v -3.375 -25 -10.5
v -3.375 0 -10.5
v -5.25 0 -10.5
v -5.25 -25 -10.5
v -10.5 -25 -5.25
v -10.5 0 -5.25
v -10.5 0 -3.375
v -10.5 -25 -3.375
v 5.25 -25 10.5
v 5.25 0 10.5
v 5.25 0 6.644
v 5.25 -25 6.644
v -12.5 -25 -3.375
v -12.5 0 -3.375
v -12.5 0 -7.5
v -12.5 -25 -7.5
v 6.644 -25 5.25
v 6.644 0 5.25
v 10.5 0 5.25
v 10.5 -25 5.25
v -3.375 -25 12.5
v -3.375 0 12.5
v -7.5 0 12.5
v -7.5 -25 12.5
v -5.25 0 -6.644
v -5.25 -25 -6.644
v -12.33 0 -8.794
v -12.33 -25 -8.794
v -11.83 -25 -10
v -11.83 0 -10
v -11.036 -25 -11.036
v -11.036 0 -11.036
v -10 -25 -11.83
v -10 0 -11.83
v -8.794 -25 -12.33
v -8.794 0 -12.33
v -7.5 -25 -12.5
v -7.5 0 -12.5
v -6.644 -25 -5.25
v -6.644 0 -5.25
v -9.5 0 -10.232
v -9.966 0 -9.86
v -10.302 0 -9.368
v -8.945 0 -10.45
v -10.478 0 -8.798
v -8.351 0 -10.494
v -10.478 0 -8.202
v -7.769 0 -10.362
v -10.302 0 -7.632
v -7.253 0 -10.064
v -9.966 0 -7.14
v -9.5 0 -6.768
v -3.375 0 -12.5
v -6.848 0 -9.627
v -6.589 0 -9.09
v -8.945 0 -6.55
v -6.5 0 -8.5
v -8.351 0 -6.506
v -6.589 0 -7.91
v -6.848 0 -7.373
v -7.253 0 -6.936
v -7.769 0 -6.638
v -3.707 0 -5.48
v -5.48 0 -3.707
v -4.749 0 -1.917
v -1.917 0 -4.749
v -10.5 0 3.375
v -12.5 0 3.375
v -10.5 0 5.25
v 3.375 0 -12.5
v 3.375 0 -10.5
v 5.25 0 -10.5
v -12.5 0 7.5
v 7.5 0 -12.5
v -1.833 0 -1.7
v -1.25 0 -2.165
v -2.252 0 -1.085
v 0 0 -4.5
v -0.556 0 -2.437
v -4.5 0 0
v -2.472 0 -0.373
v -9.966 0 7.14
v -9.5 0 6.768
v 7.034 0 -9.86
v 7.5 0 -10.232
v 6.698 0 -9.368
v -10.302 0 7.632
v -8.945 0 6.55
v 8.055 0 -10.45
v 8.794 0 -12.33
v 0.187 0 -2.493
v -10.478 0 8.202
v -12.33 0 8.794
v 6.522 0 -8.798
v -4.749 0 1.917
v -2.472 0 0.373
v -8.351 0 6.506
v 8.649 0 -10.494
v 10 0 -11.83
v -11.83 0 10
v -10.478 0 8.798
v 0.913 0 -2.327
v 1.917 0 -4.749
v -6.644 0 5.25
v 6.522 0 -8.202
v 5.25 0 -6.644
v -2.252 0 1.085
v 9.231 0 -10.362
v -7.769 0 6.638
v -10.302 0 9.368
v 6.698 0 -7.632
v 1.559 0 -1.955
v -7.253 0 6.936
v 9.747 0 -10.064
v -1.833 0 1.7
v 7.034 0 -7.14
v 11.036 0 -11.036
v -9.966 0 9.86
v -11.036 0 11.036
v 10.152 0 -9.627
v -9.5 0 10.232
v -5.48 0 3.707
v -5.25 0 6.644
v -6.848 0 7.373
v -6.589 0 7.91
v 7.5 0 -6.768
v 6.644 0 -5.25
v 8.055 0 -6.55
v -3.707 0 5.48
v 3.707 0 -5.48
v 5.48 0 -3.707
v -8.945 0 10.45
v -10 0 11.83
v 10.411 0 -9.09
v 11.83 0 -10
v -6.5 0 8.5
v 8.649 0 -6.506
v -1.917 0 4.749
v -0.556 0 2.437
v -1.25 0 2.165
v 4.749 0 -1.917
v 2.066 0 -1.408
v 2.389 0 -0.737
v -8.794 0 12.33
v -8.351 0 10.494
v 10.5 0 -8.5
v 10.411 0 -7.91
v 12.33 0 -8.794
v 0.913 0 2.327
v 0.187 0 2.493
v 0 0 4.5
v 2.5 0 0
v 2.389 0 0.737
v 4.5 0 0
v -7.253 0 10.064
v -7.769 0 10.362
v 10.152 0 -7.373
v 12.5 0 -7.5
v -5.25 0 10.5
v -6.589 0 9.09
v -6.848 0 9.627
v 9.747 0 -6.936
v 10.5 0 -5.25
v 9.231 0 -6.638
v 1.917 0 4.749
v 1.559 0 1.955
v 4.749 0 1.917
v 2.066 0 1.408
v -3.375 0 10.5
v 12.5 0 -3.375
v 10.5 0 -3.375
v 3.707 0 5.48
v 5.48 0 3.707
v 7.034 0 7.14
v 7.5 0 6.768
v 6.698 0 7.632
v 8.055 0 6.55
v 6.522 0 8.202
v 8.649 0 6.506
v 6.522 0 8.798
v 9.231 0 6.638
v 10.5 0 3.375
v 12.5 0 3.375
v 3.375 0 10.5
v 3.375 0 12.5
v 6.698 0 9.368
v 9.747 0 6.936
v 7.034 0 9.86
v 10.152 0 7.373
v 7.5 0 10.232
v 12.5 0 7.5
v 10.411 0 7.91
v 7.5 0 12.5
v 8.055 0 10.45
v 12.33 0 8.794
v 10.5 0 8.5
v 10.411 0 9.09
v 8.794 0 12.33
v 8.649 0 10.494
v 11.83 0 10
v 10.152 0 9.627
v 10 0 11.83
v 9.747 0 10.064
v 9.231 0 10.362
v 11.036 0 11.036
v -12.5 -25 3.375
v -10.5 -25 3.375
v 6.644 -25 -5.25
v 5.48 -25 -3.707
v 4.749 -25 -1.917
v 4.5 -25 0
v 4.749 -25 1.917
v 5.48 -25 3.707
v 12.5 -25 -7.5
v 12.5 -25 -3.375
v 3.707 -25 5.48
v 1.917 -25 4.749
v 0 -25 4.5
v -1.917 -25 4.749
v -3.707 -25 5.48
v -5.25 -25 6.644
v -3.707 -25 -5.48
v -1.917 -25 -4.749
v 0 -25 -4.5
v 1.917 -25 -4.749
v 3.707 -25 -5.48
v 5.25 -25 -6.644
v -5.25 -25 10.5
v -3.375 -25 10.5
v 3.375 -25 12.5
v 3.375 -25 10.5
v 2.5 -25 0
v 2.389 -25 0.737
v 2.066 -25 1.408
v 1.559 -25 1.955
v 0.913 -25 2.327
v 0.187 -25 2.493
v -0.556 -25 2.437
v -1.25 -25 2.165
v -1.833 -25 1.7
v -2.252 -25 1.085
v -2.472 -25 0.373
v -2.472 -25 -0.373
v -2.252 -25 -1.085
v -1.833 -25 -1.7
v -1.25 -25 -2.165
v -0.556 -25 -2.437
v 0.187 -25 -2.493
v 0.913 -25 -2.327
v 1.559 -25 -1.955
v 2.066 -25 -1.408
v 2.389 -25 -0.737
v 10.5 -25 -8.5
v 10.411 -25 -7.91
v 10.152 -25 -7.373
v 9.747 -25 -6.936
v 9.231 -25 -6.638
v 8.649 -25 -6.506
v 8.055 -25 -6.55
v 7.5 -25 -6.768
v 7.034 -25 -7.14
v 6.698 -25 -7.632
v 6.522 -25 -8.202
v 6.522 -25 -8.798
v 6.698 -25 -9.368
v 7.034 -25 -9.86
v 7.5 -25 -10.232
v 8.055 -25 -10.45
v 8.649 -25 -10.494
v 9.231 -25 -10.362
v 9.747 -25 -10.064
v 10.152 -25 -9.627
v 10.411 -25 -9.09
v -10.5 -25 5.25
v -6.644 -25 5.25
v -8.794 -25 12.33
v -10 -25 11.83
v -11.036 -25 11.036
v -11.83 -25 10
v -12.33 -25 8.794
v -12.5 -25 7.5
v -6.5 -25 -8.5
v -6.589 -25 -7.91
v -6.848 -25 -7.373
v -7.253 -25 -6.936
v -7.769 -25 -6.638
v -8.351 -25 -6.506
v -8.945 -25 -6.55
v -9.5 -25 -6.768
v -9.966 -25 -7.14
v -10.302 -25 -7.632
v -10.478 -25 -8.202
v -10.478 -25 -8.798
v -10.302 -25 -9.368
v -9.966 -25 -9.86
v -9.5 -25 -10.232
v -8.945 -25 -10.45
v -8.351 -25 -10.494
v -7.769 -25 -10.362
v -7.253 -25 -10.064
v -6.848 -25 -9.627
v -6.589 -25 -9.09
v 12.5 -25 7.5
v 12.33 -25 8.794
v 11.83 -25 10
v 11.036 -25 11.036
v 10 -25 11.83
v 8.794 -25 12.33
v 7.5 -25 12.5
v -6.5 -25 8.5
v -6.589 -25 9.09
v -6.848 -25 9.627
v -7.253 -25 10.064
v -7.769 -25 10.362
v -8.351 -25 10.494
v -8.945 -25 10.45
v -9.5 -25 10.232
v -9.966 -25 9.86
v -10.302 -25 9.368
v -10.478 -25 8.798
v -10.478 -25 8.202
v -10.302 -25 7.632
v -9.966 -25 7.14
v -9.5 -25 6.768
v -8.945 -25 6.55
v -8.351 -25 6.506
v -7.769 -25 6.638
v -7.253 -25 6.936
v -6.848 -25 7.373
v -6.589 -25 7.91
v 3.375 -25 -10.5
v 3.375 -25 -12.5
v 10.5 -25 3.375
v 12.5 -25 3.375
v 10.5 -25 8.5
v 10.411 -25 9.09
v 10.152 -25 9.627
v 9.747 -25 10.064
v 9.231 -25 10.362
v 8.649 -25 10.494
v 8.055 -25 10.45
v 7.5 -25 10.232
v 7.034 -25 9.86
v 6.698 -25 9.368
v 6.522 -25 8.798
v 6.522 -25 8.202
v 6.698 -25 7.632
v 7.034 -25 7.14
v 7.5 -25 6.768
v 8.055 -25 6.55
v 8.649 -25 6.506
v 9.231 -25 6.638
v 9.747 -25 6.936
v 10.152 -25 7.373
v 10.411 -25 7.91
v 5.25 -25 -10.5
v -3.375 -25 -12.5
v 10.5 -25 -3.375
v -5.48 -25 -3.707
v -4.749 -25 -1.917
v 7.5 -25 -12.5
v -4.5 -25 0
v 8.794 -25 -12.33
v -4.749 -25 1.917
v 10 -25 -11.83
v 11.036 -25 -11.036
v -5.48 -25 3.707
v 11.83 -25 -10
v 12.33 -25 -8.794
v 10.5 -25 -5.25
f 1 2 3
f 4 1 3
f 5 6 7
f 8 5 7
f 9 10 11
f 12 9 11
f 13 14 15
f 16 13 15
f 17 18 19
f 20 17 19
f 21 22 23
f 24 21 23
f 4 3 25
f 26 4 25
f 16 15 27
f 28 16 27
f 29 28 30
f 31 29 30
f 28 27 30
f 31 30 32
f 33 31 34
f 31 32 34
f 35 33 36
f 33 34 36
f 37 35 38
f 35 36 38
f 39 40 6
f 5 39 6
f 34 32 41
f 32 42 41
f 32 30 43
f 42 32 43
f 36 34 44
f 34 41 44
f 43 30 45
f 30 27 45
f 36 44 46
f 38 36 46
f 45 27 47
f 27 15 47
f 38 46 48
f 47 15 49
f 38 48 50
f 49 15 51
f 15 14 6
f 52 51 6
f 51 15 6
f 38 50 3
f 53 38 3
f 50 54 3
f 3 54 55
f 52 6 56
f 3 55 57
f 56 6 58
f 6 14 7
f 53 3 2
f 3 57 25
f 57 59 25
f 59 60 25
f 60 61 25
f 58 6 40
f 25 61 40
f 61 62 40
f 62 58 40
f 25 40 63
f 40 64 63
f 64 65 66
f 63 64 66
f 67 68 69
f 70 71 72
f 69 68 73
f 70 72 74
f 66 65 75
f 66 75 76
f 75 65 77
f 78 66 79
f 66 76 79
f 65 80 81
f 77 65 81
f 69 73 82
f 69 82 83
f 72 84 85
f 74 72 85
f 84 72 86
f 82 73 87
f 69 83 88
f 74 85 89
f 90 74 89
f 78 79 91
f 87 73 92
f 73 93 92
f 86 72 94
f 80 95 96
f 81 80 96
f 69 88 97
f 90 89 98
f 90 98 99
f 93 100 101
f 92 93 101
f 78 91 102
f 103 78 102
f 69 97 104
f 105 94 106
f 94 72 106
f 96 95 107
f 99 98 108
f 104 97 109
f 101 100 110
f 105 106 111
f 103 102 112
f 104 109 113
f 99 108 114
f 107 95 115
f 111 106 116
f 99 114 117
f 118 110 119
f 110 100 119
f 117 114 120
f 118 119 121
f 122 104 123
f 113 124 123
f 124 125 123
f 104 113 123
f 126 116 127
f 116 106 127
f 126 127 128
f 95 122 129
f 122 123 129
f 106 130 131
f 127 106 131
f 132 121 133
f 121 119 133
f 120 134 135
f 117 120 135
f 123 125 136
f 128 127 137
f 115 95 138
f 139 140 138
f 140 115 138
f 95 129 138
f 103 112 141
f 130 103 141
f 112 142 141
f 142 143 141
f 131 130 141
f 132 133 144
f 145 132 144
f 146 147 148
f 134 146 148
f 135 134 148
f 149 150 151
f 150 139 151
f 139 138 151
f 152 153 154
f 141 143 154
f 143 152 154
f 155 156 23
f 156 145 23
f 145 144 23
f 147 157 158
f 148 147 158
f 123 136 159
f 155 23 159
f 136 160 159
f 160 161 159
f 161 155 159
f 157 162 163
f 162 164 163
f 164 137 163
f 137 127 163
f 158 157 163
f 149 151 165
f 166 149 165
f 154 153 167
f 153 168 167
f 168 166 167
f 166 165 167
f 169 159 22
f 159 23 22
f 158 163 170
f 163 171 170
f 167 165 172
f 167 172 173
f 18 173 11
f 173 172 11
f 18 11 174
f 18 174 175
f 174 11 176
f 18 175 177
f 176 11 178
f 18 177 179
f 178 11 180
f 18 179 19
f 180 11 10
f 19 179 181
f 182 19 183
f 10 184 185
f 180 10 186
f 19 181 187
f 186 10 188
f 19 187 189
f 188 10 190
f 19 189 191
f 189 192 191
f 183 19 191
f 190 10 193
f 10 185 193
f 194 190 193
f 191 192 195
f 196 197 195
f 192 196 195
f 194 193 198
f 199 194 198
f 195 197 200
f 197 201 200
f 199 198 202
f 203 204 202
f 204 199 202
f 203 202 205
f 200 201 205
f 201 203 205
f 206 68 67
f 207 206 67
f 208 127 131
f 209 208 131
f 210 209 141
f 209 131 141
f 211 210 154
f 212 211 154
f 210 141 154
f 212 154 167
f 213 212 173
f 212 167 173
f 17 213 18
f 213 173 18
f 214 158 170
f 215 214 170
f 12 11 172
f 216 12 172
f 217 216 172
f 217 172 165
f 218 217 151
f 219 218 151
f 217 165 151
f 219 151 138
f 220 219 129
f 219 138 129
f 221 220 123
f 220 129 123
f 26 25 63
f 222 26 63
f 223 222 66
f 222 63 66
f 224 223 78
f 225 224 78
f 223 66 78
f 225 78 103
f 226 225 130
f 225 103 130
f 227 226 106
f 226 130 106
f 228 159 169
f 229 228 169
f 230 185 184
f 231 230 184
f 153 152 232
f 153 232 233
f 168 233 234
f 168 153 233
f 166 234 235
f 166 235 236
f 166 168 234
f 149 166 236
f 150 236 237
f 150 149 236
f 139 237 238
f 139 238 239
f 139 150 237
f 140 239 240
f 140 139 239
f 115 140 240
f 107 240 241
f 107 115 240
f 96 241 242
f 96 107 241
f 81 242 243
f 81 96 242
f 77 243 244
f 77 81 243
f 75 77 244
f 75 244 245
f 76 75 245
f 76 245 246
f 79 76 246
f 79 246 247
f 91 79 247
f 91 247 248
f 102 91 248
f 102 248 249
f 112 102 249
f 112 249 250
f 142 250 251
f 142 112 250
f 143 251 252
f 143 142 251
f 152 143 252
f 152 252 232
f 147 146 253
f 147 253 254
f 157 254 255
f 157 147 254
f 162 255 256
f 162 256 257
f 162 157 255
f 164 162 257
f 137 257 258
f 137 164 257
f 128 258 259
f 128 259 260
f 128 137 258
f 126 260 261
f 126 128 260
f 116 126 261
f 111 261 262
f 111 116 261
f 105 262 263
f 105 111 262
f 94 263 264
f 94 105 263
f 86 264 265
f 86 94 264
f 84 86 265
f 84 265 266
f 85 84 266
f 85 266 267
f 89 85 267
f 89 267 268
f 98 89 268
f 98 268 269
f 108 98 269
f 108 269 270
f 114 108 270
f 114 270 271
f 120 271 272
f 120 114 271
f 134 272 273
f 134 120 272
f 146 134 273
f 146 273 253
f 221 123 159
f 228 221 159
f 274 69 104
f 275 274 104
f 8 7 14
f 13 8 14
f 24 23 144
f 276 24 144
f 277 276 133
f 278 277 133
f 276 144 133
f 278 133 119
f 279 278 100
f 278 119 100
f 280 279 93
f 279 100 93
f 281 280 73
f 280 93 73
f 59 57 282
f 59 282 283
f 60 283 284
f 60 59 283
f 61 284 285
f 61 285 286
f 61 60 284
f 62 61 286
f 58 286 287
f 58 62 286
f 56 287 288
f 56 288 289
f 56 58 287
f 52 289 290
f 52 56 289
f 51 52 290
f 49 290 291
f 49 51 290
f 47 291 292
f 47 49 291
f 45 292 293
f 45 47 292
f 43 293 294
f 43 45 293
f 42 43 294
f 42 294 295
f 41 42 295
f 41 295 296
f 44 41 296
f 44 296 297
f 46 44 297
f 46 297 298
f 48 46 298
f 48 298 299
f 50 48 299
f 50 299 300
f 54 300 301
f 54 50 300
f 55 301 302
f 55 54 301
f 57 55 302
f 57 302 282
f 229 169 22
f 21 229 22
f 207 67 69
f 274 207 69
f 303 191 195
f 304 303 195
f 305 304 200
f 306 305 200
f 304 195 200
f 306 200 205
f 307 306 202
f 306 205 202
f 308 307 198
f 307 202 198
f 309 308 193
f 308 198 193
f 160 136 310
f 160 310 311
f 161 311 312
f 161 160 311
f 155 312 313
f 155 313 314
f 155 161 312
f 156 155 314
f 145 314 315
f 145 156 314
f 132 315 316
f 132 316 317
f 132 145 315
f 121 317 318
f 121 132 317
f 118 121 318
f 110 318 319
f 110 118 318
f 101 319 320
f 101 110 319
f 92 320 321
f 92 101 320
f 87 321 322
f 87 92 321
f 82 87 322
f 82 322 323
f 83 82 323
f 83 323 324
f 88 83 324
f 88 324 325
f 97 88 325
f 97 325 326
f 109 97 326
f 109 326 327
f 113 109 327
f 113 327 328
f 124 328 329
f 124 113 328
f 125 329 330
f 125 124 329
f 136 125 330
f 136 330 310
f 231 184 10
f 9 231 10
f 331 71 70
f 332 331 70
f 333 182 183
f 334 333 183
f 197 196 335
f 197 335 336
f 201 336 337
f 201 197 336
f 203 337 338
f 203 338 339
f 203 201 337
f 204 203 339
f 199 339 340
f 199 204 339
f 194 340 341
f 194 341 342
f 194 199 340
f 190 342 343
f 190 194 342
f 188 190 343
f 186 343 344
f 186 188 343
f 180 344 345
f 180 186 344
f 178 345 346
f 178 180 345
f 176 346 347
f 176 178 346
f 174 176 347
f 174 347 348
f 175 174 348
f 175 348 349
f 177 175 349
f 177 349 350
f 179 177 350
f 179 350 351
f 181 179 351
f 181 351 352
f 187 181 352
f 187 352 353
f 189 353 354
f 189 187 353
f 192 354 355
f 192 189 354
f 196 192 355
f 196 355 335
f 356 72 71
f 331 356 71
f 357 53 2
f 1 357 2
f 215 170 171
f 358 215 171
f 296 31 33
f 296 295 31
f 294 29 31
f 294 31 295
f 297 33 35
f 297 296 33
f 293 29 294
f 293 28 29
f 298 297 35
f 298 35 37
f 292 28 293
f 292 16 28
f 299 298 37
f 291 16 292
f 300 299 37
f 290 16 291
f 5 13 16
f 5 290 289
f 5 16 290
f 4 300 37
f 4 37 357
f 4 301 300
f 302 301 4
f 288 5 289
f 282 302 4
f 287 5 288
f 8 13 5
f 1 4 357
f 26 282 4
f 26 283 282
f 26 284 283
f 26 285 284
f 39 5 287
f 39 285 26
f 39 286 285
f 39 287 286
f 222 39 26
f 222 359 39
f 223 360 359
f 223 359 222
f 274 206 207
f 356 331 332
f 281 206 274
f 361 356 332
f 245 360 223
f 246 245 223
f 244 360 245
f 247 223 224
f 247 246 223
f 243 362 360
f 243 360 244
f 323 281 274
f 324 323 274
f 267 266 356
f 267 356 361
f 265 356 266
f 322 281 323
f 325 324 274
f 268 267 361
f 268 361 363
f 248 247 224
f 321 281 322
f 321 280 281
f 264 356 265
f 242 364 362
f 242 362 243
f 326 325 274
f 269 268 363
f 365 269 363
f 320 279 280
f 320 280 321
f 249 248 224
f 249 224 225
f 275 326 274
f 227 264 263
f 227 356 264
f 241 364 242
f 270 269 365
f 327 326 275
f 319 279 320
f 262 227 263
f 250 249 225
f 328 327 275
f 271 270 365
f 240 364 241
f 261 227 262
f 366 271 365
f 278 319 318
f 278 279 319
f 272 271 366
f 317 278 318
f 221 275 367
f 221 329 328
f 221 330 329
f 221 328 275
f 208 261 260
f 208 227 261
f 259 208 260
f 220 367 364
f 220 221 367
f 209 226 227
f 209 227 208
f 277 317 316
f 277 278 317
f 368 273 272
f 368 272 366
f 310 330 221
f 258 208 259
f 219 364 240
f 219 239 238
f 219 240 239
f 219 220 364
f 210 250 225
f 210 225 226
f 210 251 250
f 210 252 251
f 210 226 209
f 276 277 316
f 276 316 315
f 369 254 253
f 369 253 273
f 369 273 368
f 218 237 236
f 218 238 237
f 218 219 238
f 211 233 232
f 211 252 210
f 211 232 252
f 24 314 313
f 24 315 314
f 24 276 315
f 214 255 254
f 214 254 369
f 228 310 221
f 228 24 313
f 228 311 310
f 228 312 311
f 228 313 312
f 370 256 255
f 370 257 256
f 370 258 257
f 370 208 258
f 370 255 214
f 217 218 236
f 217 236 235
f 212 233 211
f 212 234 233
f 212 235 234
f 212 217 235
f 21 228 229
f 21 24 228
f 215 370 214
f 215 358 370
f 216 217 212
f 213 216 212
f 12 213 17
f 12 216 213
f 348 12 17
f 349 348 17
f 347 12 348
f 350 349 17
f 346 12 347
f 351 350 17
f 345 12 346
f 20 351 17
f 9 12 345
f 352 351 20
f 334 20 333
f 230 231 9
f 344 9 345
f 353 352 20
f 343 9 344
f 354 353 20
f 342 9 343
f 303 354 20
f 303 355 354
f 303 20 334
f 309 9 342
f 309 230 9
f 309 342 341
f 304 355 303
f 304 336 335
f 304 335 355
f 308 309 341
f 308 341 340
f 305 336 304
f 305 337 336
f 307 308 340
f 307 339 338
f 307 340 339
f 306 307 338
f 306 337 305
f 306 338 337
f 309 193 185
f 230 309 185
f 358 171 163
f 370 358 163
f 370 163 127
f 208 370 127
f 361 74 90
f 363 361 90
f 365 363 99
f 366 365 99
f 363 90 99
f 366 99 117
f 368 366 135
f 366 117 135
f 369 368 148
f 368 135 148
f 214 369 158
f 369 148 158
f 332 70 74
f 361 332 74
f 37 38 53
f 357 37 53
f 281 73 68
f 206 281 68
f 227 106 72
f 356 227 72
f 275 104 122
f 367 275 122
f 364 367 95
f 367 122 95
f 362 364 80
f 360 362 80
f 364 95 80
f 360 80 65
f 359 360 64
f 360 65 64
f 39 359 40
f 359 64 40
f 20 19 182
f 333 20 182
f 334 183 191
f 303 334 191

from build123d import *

# Parameters (mm, degrees)
F0_R     = 2
F0_R_2   = 2.5
F2_DEPTH = 25


# Not quite as in the source:
# - ends of sketch curves that miss each other by under 0.0002 mm in the source are joined


with BuildPart() as f2:
    # F0 (on Front) → F2 (new body)
    with BuildSketch(Plane.XZ):
        with BuildLine():
            ThreePointArc((5.2500001607, 6.6439288361), (0, 4.5), (-5.2500001607, 6.6439288361))
            Line((-5.2500001607, 6.6439288361), (-5.25, 10.5))
            Line((-5.25, 10.5), (-3.375, 10.5))
            Line((-3.375, 10.5), (-3.375, 12.5))
            Line((-3.375, 12.5), (-7.5, 12.5))
            ThreePointArc((-7.5, 12.5), (-11.0355339059, 11.0355339059), (-12.5, 7.5))
            Line((-12.5, 7.5), (-12.5, 3.375))
            Line((-12.5, 3.375), (-10.5, 3.375))
            Line((-10.5, 3.375), (-10.5, 5.25))
            Line((-10.5, 5.25), (-6.643929, 5.25))
            ThreePointArc((-6.643929, 5.25), (-4.5, 0), (-6.6439288361, -5.2500001607))
            Line((-6.6439288361, -5.2500001607), (-10.5, -5.25))
            Line((-10.5, -5.25), (-10.5, -3.375))
            Line((-10.5, -3.375), (-12.5, -3.375))
            Line((-12.5, -3.375), (-12.5, -7.5))
            ThreePointArc((-12.5, -7.5), (-11.0355339059, -11.0355339059), (-7.5, -12.5))
            Line((-7.5, -12.5), (-3.375, -12.5))
            Line((-3.375, -12.5), (-3.375, -10.5))
            Line((-3.375, -10.5), (-5.25, -10.5))
            Line((-5.25, -10.5), (-5.25, -6.643929))
            ThreePointArc((-5.25, -6.643929), (0, -4.5), (5.2500001607, -6.6439288361))
            Line((5.2500001607, -6.6439288361), (5.25, -10.5))
            Line((5.25, -10.5), (3.375, -10.5))
            Line((3.375, -10.5), (3.375, -12.5))
            Line((3.375, -12.5), (7.5, -12.5))
            ThreePointArc((7.5, -12.5), (11.0355339059, -11.0355339059), (12.5, -7.5))
            Line((12.5, -7.5), (12.5, -3.375))
            Line((12.5, -3.375), (10.5, -3.375))
            Line((10.5, -3.375), (10.5, -5.25))
            Line((10.5, -5.25), (6.643929, -5.25))
            ThreePointArc((6.643929, -5.25), (4.5, 0), (6.6439288361, 5.2500001607))
            Line((6.6439288361, 5.2500001607), (10.5, 5.25))
            Line((10.5, 5.25), (10.5, 3.375))
            Line((10.5, 3.375), (12.5, 3.375))
            Line((12.5, 3.375), (12.5, 7.5))
            ThreePointArc((12.5, 7.5), (11.0355339059, 11.0355339059), (7.5, 12.5))
            Line((7.5, 12.5), (3.375, 12.5))
            Line((3.375, 12.5), (3.375, 10.5))
            Line((3.375, 10.5), (5.25, 10.5))
            Line((5.25, 10.5), (5.2500001607, 6.6439288361))
        make_face()
        with Locations((-8.5, -8.5)):
            Circle(F0_R, mode=Mode.SUBTRACT)
        with Locations((8.5, -8.5)):
            Circle(F0_R, mode=Mode.SUBTRACT)
        with Locations((-8.5, 8.5)):
            Circle(F0_R, mode=Mode.SUBTRACT)
        Circle(F0_R_2, mode=Mode.SUBTRACT)
        with Locations((8.5, 8.5)):
            Circle(F0_R, mode=Mode.SUBTRACT)
    extrude(amount=F2_DEPTH)


solid = f2.part
